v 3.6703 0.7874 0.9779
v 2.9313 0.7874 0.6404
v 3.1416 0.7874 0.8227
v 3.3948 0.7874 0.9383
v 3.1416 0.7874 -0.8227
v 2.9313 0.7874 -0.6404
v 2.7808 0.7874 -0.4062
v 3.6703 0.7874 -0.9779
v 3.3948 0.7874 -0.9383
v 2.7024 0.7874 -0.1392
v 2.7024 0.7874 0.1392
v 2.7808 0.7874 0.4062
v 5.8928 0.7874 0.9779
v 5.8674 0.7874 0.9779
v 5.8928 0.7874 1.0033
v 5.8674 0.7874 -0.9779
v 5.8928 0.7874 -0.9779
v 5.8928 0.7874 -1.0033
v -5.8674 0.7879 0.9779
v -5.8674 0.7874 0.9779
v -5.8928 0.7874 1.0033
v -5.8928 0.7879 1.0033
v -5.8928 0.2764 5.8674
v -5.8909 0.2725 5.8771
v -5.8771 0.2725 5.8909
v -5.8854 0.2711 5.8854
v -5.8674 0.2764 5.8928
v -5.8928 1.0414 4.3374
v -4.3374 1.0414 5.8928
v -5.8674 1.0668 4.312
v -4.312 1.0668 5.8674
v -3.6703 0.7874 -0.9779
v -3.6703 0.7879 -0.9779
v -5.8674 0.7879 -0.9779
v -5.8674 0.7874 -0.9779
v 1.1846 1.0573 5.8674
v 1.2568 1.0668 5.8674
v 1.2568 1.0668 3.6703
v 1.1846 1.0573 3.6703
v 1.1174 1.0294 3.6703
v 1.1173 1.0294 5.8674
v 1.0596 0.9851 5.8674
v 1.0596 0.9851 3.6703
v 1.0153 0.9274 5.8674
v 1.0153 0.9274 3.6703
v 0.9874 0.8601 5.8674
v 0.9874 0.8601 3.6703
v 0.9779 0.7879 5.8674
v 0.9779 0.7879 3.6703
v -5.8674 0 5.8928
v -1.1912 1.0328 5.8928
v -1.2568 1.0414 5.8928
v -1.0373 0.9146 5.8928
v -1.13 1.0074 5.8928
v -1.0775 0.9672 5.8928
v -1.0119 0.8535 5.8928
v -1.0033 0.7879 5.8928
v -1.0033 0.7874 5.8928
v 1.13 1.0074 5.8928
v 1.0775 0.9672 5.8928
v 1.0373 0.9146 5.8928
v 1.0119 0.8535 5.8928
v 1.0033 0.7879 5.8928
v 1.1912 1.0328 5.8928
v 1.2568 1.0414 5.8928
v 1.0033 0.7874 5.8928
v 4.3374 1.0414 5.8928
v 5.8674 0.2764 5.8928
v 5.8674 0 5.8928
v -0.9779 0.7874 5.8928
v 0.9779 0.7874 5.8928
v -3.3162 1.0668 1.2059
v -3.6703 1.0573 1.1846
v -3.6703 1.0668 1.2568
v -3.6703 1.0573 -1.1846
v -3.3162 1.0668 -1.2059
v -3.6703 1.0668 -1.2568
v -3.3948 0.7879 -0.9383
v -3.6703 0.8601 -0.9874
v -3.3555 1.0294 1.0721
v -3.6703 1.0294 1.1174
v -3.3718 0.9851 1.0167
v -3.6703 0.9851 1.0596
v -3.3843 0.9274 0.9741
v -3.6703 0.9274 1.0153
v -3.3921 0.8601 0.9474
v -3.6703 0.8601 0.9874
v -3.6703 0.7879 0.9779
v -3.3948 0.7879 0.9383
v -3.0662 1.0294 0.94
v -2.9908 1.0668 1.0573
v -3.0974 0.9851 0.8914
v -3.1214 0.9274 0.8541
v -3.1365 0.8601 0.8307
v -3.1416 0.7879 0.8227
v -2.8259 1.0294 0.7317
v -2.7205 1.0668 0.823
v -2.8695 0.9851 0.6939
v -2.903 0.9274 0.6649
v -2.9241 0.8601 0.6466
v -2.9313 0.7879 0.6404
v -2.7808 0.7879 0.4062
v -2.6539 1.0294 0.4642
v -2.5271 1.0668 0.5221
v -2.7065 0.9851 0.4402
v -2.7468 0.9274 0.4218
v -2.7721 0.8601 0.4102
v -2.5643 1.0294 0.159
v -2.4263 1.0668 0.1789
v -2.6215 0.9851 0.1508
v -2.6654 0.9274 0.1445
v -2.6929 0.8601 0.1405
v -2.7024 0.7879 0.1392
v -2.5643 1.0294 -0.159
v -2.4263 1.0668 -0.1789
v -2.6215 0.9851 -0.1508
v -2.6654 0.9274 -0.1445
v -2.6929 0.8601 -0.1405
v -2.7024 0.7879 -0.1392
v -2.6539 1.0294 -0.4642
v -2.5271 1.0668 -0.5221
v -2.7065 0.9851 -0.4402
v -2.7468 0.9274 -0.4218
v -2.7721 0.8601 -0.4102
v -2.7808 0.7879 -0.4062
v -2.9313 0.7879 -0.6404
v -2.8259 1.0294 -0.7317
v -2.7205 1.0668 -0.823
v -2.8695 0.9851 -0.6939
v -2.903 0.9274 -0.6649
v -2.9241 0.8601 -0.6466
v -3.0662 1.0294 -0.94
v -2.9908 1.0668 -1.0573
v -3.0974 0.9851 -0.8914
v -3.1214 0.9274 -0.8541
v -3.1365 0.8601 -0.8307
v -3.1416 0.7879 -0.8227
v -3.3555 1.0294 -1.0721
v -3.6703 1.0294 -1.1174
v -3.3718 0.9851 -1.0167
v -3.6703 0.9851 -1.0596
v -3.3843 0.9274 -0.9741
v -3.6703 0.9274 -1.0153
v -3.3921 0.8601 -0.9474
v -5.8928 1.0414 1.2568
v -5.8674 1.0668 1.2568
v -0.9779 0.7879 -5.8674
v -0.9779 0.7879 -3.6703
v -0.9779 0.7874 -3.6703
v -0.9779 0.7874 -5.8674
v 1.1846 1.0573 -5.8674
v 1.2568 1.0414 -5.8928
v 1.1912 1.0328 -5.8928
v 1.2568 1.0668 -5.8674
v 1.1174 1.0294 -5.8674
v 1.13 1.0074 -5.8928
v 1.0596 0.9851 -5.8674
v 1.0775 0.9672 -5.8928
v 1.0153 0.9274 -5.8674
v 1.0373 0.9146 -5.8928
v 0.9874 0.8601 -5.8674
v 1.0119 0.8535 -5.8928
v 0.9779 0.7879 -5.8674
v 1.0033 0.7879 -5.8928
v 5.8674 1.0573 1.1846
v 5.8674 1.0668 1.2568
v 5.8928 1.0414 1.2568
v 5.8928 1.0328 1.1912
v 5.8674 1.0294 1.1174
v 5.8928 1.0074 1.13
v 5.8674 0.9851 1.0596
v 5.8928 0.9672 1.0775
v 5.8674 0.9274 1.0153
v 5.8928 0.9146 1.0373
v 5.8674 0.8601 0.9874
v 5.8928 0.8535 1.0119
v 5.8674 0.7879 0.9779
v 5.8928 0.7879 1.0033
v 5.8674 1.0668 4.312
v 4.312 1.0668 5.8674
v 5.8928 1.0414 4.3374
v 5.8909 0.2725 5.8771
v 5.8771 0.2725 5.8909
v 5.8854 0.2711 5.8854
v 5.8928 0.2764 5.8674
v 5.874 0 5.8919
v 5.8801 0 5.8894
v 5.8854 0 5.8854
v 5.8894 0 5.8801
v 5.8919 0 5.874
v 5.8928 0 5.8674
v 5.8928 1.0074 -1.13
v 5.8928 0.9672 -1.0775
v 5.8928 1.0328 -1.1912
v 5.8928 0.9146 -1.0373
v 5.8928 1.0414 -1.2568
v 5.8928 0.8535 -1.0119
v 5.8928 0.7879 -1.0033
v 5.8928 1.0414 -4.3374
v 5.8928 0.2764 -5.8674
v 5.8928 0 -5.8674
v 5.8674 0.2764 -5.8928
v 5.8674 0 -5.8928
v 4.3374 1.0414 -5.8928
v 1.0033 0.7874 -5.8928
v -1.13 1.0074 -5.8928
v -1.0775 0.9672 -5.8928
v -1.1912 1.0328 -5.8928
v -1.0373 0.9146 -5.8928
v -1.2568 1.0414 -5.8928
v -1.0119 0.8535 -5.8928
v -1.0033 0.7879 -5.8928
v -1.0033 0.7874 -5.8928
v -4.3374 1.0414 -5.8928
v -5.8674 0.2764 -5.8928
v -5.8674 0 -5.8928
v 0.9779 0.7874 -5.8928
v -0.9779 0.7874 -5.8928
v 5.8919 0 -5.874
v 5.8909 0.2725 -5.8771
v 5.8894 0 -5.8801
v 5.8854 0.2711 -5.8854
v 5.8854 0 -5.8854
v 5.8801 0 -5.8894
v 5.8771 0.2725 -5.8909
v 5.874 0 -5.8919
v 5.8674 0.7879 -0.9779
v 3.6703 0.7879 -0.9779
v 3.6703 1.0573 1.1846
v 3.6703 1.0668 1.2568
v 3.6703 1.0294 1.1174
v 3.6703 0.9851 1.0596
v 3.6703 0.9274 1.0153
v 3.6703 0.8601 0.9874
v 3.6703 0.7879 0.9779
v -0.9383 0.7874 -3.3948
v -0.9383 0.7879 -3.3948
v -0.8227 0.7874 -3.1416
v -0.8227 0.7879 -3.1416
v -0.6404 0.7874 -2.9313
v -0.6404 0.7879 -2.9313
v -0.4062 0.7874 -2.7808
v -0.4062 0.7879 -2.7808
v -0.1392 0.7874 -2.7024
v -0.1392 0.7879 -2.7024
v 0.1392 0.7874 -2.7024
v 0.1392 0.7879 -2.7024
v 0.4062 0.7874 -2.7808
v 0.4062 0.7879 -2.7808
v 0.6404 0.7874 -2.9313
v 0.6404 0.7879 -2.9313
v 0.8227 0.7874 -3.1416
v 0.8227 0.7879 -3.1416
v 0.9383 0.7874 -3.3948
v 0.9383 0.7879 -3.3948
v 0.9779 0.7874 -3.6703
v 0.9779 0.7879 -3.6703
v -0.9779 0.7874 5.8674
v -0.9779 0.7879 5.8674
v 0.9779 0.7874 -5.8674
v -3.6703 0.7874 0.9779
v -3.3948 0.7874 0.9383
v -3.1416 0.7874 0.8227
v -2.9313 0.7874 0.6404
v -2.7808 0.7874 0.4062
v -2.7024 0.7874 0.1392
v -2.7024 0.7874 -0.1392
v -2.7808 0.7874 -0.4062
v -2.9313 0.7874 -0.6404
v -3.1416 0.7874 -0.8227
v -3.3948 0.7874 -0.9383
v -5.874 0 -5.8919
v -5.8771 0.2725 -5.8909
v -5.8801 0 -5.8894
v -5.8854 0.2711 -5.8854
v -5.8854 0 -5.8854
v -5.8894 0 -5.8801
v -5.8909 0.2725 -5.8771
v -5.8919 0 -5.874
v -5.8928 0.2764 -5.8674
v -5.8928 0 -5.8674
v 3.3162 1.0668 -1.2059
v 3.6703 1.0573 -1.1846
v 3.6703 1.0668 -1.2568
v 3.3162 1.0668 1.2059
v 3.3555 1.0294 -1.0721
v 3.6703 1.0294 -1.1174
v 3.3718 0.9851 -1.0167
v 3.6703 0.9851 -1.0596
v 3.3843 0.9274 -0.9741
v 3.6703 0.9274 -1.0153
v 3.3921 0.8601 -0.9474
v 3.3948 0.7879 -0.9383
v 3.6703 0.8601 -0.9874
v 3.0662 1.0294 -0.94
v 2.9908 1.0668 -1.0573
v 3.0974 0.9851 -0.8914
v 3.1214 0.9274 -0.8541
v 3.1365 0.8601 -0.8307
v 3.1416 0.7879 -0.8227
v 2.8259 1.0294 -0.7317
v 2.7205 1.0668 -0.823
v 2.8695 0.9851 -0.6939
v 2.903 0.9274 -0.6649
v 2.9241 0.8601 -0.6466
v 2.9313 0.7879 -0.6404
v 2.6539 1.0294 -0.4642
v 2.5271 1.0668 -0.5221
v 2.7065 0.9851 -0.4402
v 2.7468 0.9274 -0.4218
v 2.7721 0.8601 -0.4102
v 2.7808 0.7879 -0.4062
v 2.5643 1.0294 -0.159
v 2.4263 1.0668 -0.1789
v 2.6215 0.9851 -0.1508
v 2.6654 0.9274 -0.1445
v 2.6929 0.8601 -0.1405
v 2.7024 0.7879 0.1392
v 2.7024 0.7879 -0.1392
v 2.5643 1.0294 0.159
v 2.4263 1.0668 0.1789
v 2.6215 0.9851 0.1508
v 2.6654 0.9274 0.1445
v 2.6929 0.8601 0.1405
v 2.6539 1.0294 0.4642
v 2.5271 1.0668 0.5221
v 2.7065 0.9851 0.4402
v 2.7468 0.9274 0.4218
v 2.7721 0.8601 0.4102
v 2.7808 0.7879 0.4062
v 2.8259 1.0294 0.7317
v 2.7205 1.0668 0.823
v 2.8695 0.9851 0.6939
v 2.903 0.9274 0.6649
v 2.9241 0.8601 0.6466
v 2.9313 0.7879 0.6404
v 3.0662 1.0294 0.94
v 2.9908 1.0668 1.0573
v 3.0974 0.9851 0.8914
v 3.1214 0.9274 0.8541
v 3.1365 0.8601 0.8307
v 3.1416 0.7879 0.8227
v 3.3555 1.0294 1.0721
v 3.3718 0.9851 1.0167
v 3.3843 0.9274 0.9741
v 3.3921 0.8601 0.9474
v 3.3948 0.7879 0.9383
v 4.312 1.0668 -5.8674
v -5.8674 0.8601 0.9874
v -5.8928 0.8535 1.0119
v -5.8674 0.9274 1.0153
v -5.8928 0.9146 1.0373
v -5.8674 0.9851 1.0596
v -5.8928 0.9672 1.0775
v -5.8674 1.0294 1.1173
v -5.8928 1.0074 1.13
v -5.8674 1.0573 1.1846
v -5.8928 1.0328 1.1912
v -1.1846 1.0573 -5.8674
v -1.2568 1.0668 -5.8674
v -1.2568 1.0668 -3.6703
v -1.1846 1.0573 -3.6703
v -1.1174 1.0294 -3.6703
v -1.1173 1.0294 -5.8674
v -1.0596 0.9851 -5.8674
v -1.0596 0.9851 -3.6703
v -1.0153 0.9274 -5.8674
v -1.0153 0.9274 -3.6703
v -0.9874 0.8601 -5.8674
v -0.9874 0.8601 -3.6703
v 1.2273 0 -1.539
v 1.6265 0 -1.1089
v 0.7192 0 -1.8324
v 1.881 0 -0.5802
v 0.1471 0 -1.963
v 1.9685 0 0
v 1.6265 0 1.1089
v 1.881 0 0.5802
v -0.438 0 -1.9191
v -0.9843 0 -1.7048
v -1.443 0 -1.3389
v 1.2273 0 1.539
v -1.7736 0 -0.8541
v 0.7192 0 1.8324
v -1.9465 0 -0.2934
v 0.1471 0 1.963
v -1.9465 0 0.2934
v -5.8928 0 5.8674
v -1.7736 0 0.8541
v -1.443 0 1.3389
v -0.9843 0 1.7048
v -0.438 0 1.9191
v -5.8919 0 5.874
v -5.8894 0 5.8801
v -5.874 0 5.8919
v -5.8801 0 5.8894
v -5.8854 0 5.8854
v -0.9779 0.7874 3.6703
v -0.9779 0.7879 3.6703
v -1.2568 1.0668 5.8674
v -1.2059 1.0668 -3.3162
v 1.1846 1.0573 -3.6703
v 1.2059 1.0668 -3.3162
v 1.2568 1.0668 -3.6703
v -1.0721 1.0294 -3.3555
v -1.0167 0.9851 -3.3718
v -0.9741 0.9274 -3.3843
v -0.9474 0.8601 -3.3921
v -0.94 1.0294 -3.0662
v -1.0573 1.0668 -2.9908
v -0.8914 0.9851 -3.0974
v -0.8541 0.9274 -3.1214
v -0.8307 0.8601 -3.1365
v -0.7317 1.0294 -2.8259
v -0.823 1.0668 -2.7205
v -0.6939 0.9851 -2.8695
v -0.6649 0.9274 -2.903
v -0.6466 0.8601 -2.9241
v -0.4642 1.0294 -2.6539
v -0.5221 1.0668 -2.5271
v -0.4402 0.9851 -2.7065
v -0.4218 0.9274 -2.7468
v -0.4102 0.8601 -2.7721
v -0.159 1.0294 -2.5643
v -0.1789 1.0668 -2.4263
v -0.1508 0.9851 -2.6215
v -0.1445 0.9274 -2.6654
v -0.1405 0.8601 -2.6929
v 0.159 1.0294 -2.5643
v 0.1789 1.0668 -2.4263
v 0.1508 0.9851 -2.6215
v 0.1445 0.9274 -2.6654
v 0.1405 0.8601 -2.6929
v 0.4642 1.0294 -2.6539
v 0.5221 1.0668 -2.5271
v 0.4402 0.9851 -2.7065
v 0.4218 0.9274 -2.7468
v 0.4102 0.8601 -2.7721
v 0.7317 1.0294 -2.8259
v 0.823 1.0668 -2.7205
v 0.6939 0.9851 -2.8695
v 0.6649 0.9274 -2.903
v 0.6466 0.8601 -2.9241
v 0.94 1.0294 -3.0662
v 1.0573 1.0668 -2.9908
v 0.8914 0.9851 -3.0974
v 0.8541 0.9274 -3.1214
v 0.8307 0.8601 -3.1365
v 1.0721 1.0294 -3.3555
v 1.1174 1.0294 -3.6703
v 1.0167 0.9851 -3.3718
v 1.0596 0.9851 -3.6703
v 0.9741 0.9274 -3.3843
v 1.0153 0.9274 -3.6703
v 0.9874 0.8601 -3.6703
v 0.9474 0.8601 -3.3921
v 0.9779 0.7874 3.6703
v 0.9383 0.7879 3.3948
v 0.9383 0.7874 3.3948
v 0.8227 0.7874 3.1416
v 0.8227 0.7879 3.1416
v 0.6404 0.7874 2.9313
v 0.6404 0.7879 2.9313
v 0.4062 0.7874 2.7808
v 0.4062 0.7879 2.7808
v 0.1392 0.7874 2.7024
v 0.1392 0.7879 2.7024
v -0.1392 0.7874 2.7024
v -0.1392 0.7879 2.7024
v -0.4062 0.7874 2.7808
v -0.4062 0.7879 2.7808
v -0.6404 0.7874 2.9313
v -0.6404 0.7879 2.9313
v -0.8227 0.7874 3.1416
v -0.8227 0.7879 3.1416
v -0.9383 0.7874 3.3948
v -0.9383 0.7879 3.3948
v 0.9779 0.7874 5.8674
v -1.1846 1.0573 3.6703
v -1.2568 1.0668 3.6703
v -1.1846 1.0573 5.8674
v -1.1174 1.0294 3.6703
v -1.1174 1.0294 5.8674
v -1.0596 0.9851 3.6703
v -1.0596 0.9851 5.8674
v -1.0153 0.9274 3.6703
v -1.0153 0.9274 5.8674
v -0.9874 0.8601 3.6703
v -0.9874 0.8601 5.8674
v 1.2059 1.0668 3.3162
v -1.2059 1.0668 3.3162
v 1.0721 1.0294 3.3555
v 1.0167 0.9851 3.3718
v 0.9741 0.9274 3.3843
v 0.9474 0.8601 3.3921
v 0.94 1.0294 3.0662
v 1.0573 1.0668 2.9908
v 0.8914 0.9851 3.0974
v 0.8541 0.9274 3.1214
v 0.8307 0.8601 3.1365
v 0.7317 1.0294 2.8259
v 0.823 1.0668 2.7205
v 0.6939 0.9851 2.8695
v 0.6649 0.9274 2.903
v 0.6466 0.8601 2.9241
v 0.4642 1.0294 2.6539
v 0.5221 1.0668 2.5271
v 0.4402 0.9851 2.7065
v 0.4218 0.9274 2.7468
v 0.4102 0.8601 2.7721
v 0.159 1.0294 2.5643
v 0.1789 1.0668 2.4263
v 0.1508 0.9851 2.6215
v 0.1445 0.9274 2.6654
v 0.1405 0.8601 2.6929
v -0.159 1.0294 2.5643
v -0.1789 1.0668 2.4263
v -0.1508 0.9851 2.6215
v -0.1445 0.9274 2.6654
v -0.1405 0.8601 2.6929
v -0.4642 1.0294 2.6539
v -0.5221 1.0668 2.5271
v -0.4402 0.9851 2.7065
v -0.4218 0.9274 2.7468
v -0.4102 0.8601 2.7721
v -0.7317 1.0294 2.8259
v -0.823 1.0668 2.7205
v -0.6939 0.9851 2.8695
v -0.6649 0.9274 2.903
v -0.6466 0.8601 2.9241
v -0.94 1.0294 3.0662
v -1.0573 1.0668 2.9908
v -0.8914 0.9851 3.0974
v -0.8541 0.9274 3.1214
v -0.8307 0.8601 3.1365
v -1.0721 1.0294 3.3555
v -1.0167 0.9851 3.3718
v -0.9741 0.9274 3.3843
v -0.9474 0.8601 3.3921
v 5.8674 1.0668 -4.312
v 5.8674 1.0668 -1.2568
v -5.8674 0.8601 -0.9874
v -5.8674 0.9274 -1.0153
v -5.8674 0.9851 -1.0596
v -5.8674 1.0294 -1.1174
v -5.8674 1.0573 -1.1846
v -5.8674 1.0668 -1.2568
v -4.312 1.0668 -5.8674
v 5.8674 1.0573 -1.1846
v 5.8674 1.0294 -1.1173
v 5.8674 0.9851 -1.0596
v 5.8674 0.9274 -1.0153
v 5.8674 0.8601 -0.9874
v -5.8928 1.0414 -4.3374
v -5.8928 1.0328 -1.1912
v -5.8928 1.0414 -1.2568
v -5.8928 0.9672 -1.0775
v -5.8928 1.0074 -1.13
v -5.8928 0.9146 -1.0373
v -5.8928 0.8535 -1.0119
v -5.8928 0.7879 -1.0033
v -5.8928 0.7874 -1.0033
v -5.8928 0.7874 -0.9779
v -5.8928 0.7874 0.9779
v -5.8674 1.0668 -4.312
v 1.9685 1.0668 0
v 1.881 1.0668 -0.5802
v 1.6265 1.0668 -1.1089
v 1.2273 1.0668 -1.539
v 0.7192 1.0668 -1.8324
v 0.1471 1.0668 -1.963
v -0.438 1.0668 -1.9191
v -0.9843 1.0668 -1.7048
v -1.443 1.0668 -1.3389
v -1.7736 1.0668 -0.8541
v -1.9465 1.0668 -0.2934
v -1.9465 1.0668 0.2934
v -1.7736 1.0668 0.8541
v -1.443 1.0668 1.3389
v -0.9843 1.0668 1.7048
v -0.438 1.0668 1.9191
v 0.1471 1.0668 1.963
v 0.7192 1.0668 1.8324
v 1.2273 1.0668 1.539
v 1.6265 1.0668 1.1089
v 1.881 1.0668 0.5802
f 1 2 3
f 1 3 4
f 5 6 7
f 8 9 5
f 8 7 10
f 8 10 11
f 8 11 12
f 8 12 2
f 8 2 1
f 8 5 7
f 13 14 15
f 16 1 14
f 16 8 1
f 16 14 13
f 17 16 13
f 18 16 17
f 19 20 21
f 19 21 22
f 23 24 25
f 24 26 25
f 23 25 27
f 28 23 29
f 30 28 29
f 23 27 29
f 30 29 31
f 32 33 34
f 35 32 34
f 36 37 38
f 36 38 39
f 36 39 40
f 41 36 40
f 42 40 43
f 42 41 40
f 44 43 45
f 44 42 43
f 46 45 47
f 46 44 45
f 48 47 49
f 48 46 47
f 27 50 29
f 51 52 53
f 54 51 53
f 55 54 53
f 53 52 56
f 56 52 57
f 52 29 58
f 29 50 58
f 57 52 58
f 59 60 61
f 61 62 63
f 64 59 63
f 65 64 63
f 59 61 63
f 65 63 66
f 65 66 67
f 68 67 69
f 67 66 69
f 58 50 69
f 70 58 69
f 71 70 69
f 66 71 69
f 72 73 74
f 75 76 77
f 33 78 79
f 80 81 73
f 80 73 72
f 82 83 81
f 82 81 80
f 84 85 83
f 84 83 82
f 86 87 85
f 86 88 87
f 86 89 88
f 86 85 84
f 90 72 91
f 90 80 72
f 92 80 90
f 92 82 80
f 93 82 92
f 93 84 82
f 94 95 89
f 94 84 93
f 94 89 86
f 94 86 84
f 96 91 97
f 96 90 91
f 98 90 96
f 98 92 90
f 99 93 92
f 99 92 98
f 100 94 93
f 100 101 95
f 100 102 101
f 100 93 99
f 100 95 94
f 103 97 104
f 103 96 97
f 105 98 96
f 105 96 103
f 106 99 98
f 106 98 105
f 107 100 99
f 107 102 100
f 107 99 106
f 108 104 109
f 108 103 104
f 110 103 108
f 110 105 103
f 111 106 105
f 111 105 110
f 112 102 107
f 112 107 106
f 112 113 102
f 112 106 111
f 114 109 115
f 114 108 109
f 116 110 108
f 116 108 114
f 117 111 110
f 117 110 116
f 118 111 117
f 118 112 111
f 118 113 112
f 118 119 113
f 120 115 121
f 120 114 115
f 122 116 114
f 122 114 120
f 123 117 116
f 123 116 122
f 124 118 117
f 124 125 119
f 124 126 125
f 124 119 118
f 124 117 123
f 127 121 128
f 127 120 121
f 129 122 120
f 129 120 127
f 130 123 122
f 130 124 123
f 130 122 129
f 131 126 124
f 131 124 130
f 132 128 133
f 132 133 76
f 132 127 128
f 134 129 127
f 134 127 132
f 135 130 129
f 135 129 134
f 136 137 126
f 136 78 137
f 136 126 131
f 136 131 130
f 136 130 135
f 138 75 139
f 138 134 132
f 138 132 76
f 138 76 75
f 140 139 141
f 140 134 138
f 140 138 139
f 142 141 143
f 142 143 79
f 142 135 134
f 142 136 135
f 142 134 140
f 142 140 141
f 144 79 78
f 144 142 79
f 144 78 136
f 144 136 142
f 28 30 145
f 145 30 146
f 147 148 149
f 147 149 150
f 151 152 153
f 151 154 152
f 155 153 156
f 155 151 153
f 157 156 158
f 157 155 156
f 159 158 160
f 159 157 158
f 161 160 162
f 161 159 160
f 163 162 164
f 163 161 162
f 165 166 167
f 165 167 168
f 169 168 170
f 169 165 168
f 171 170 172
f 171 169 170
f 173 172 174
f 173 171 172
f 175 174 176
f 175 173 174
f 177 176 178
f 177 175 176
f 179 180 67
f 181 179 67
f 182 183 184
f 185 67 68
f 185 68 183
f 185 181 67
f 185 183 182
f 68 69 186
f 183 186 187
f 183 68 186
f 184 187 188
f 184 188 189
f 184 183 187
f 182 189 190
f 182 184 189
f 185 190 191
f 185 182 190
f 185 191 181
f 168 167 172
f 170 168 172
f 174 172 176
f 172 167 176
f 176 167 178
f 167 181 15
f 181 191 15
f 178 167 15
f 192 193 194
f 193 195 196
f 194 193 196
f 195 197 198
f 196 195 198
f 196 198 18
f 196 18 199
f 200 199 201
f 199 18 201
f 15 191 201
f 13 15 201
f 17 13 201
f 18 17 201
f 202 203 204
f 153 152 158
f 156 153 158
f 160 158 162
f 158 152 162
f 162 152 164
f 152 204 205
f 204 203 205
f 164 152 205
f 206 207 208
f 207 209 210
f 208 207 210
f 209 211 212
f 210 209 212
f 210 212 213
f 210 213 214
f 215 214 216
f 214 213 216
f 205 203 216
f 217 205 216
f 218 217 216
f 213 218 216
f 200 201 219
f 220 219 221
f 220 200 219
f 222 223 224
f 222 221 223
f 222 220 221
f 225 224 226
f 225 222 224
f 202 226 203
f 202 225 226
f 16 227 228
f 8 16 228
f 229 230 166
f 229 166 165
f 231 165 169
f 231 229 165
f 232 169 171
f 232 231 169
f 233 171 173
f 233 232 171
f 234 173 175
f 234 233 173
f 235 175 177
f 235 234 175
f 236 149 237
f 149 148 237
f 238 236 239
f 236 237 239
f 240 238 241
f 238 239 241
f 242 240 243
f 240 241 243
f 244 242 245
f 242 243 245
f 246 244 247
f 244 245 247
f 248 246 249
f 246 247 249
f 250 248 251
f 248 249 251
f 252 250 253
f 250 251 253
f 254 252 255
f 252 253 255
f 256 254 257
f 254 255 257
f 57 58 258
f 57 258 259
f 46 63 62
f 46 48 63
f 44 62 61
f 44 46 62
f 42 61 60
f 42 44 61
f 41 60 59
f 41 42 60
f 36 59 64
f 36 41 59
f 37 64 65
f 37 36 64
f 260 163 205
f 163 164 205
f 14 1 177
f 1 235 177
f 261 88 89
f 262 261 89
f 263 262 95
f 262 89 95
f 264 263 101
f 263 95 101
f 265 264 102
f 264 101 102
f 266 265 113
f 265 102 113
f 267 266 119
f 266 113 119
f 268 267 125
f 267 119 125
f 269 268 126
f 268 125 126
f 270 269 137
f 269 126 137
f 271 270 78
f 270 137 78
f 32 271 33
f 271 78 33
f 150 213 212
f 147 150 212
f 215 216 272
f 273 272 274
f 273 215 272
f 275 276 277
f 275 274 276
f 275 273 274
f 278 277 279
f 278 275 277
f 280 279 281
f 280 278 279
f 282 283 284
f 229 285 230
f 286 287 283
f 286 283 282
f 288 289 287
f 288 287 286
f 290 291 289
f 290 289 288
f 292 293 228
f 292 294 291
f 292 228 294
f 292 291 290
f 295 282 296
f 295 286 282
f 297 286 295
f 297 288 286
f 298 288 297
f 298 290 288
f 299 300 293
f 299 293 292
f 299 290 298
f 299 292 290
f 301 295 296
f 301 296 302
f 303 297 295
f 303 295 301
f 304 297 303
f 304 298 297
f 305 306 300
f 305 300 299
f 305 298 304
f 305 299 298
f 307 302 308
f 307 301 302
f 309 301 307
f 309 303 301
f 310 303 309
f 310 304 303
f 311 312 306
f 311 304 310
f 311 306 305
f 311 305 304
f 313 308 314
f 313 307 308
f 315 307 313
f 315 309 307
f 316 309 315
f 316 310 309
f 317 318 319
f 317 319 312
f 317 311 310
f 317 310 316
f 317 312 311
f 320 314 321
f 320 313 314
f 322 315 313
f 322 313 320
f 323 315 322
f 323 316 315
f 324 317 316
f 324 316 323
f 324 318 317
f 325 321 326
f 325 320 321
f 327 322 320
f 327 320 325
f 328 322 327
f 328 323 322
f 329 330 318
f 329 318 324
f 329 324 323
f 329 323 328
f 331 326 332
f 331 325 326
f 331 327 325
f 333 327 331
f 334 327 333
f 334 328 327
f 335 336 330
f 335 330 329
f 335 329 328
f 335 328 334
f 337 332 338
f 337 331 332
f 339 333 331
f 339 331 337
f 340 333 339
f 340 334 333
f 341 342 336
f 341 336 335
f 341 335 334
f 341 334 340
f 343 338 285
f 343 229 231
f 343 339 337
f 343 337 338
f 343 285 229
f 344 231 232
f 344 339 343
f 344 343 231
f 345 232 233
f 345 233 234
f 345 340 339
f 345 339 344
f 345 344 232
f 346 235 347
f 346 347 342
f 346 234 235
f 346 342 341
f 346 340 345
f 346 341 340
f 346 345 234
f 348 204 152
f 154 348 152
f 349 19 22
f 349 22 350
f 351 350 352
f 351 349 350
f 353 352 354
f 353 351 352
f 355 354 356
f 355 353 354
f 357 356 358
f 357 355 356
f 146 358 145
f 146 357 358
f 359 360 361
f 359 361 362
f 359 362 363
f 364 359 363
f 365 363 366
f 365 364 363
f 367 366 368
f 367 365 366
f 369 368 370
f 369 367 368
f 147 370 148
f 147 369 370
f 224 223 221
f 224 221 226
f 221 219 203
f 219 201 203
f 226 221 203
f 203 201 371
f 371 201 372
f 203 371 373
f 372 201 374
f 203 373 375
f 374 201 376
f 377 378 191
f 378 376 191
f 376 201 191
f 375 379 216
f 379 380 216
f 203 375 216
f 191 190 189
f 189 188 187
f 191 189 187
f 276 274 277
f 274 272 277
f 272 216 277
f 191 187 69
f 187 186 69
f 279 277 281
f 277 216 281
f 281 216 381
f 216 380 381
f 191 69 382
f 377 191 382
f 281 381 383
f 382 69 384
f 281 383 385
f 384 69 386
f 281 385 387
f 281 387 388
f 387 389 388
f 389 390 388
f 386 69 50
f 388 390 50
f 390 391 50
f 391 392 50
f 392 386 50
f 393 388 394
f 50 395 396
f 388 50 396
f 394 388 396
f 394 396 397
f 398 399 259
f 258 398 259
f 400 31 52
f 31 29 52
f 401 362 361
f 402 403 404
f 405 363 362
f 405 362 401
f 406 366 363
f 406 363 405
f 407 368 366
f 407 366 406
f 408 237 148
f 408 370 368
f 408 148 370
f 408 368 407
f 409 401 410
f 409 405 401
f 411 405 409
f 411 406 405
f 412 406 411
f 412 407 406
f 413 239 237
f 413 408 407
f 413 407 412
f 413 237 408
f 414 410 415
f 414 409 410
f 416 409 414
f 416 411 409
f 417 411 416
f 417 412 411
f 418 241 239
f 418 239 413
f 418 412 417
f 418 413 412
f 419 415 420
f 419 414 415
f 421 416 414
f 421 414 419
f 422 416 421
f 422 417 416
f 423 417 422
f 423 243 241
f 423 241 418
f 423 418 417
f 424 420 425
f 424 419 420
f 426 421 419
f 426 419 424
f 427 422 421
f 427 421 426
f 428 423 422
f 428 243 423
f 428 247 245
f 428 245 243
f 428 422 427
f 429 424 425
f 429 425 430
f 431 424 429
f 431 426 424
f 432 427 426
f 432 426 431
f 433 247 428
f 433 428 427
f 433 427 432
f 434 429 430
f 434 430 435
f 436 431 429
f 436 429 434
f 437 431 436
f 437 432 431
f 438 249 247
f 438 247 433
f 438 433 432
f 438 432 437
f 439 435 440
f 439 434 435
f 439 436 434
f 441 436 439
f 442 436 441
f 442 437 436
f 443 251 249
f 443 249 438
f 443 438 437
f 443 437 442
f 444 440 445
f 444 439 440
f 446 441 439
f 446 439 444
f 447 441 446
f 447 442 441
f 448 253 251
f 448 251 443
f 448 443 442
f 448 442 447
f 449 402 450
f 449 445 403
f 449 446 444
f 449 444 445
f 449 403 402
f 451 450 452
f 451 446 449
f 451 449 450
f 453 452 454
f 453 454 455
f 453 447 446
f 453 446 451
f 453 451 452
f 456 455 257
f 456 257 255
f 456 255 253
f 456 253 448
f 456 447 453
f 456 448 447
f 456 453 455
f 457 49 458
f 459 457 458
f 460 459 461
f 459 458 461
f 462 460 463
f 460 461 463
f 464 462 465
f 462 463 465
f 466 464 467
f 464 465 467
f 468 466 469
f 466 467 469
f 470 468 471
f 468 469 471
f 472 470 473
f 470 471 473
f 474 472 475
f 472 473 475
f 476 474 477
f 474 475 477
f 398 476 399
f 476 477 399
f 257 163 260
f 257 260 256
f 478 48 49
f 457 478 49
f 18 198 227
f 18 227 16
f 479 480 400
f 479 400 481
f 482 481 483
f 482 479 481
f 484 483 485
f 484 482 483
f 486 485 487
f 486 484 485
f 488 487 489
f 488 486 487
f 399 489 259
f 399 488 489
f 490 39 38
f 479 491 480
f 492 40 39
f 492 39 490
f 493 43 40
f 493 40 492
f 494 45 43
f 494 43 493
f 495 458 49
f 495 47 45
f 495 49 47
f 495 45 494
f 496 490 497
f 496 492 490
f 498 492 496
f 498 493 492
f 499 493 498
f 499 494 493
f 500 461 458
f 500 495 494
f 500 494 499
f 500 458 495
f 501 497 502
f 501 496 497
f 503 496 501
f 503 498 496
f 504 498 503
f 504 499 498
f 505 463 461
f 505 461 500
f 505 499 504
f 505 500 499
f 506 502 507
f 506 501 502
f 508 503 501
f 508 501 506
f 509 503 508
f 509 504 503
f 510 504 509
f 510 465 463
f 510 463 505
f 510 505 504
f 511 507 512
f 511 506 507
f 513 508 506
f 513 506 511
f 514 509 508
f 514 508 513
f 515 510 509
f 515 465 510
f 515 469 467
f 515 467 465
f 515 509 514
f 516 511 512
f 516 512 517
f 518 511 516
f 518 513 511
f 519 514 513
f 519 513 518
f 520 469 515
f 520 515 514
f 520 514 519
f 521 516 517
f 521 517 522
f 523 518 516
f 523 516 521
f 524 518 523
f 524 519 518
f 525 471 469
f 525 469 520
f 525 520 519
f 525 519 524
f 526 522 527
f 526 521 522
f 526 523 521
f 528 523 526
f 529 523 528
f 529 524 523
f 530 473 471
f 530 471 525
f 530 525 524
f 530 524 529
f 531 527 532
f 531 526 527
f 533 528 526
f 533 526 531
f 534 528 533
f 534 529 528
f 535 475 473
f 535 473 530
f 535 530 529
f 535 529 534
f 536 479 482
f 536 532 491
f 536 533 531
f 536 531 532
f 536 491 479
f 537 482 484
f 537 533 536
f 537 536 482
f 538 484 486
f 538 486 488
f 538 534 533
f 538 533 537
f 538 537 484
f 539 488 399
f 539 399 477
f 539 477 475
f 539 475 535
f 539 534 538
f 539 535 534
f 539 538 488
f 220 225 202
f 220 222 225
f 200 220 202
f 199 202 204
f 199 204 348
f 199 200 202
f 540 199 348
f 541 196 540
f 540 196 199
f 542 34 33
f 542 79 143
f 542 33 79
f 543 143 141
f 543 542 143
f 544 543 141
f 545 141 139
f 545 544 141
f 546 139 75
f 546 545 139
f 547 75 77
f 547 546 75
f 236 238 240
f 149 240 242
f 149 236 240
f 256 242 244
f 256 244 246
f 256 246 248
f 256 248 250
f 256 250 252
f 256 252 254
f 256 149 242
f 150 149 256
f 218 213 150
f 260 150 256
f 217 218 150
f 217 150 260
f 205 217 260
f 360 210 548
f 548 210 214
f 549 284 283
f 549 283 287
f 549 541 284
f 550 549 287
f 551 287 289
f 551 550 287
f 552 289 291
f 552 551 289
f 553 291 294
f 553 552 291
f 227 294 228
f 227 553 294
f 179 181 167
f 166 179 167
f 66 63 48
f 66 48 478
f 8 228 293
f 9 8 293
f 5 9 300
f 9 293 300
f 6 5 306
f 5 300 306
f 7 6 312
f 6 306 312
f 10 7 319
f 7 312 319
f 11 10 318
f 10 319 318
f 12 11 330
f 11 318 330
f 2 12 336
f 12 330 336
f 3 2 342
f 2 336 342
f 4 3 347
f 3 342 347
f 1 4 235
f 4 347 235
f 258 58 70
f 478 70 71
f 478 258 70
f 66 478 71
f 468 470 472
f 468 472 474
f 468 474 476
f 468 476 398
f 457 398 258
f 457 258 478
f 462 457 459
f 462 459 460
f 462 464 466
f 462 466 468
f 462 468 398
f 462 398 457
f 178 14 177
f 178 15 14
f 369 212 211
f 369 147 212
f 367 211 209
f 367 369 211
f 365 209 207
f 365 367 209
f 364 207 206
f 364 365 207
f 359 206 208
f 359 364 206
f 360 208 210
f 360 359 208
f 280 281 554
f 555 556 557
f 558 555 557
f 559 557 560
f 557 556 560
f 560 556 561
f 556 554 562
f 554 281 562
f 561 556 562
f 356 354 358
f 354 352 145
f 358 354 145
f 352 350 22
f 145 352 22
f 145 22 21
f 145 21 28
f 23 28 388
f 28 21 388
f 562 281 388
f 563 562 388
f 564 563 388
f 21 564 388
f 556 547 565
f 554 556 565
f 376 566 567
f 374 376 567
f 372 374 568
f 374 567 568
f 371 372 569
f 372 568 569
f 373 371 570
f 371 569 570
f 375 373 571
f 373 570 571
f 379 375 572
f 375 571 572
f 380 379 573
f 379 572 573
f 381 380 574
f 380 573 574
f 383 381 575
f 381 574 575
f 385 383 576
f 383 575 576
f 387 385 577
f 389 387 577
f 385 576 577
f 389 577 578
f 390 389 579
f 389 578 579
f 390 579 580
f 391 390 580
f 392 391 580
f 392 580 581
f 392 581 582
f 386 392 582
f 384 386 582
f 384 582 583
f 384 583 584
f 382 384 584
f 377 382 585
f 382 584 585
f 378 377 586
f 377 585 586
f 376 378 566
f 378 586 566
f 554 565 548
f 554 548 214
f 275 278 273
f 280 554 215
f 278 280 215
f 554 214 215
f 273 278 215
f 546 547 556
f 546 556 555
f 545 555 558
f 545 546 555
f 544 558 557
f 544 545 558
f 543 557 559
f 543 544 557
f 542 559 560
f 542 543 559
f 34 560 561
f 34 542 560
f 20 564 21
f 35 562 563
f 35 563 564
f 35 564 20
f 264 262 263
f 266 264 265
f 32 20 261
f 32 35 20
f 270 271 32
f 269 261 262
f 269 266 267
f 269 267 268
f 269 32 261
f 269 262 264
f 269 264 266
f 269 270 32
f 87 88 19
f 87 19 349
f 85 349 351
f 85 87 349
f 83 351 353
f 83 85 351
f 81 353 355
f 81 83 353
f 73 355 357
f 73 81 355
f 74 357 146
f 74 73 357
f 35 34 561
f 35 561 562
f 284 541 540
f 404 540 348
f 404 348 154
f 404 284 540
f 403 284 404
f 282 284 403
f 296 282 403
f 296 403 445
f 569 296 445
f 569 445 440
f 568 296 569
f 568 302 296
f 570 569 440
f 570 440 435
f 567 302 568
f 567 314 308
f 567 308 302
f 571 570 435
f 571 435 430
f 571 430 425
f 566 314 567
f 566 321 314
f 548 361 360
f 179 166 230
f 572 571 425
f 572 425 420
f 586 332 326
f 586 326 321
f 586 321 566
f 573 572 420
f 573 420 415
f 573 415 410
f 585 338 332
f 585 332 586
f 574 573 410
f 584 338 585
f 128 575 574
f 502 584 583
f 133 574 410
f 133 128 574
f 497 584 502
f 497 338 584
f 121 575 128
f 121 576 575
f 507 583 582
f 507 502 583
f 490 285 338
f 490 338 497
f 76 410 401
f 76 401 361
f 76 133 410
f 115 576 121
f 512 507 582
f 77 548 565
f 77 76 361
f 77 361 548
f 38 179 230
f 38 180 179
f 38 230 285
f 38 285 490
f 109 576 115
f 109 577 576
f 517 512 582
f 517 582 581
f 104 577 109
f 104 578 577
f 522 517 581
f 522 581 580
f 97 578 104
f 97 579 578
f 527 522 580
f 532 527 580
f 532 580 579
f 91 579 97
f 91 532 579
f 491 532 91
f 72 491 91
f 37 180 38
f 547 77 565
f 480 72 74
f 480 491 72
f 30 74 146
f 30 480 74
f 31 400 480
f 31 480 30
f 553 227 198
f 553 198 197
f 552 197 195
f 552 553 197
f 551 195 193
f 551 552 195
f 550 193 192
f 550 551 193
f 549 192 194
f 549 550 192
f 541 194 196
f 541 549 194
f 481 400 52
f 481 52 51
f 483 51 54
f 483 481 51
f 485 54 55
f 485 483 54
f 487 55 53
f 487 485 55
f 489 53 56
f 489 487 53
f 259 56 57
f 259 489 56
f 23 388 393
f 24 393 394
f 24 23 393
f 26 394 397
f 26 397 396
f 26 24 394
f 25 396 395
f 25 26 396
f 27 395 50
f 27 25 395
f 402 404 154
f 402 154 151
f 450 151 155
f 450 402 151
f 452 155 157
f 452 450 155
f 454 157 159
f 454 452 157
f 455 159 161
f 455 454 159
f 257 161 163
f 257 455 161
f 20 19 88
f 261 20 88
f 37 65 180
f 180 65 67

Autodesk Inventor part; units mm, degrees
ref_plane "YZ Plane" through (0, 0, 0) normal (1, 0, 0) x (0, 1, 0)
ref_plane "XZ Plane" through (0, 0, 0) normal (0, 1, 0) x (-1, 0, 0)
ref_plane "XY Plane" through (0, 0, 0) normal (0, 0, 1) x (1, 0, 0)
sketch "Sketch1" plane through (0, 0, 0) normal (0, 1, 0) x (-1, 0, 0)
  line L0 (5.8928, 5.8928) -> (-5.8928, 5.8928)
  line L1 (-5.8928, 5.8928) -> (-5.8928, -5.8928)
  line L2 (-5.8928, -5.8928) -> (5.8928, -5.8928)
  line L3 (5.8928, -5.8928) -> (5.8928, 5.8928)
  point P0 (0, 0)
  point P1 (5.8928, 0)
  point P2 (0, -5.8928)
  dimension "d0" = 11.7856
extrude "Extrusion1" add sketch "Sketch1" along normal blind 1.0668
sketch "Sketch2" plane through (0, 1.0668, 0) normal (0, 1, 0) x (1, 0, 0)
  line L0 (3.6703, -0.9779) -> (5.8928, -0.9779)
  line L1 (5.8928, -0.9779) -> (5.8928, 0.9779)
  line L2 (5.8928, 0.9779) -> (3.6703, 0.9779)
  line L3 (2.6924, 0) -> (2.6924, 0)
  line L4 (5.8928, -5.8928) -> (5.8928, 5.8928) projected
  arc A0 (3.6703, 0.9779) -> (2.6924, 0) centre (3.6703, 0) ccw
  arc A1 (2.6924, 0) -> (3.6703, -0.9779) centre (3.6703, 0) ccw
  line L5 (-0.9779, -5.8928) -> (0.9779, -5.8928)
  line L6 (0.9779, -5.8928) -> (0.9779, -3.6703)
  line L7 (0, -2.6924) -> (0, -2.6924)
  line L8 (-0.9779, -3.6703) -> (-0.9779, -5.8928)
  arc A2 (0.9779, -3.6703) -> (0, -2.6924) centre (0, -3.6703) ccw
  arc A3 (0, -2.6924) -> (-0.9779, -3.6703) centre (0, -3.6703) ccw
  line L9 (-5.8928, 5.8928) -> (-5.8928, -5.8928) projected
  line L10 (-5.8928, -0.9779) -> (-3.6703, -0.9779)
  line L11 (-2.6924, 0) -> (-2.6924, 0)
  line L12 (-3.6703, 0.9779) -> (-5.8928, 0.9779)
  line L13 (-5.8928, 0.9779) -> (-5.8928, -0.9779)
  arc A4 (-3.6703, -0.9779) -> (-2.6924, 0) centre (-3.6703, 0) ccw
  arc A5 (-2.6924, 0) -> (-3.6703, 0.9779) centre (-3.6703, 0) ccw
  line L14 (5.8928, 5.8928) -> (-5.8928, 5.8928) projected
  line L15 (-0.9779, 5.8928) -> (0.9779, 5.8928)
  line L16 (0.9779, 5.8928) -> (0.9779, 3.6703)
  line L17 (0, 2.6924) -> (0, 2.6924)
  line L18 (-0.9779, 3.6703) -> (-0.9779, 5.8928)
  arc A6 (-0.9779, 3.6703) -> (0, 2.6924) centre (0, 3.6703) ccw
  arc A7 (0, 2.6924) -> (0.9779, 3.6703) centre (0, 3.6703) ccw
  point P0 (0, 0)
  point P1 (2.6924, 0.9779)
  point P2 (2.6924, 0)
  point P3 (5.8928, 0)
  point P4 (5.8928, 0)
  point P5 (0.9779, -2.6924)
  point P6 (-0.9779, -2.6924)
  point P7 (0, -2.6924)
  point P8 (-2.6924, 0.9779)
  point P9 (-5.8928, 0)
  point P10 (-5.8928, 0)
  point P11 (0.9779, 2.6924)
  point P12 (0, 5.8928)
  point P13 (0, 5.8928)
  dimension "d3" = 3.2004
  dimension "d4" = 1.9558
  dimension "d5" = 0.9779
  dimension "d6" = 1.9558
  dimension "d7" = 3.2004
  dimension "d8" = 0.9779
  dimension "d9" = 3.2004
  dimension "d10" = 0.9779
  dimension "d11" = 3.2004
  dimension "d12" = 0.9779
extrude "Extrusion2" cut sketch "Sketch2" against normal blind 0.2794
fillet "Fillet1" radius 0.2794 12 edges at (-4.7816, 1.0668, 0.9779) (-4.7816, 1.0668, -0.9779) (-2.6924, 1.0668, 0) (0, 1.0668, -2.6924) (0.9779, 1.0668, -4.7816) (-0.9779, 1.0668, -4.7816) (2.6924, 1.0668, 0) (4.7816, 1.0668, 0.9779) (4.7816, 1.0668, -0.9779) (0, 1.0668, 2.6924) (-0.9779, 1.0668, 4.7816) (0.9779, 1.0668, 4.7816)
sketch "Sketch3" plane through (0, 0, 0) normal (0, -1, 0) x (1, 0, 0)
  point P0 (0, 0)
sketch "Sketch4" plane through (0, 1.0668, 0) normal (0, 1, 0) x (1, 0, 0)
  circle A0 centre (0, 0) radius 1.9685
  dimension "d16" = 3.937
extrude "Extrusion3" cut sketch "Sketch4" against normal through all
chamfer "Chamfer1" distance 0.0254 angle 45 16 edges at (5.8928, 1.0668, 3.5748) (5.8928, 0.9851, 1.0596) (3.5748, 1.0668, 5.8928) (1.0596, 0.9851, 5.8928) (5.8928, 1.0668, -3.5748) (5.8928, 0.9851, -1.0596) (3.5748, 1.0668, -5.8928) (1.0596, 0.9851, -5.8928) (-3.5748, 1.0668, -5.8928) (-1.0596, 0.9851, -5.8928) (-5.8928, 1.0668, -3.5748) (-5.8928, 0.9851, -1.0596) (-5.8928, 1.0668, 3.5748) (-5.8928, 0.9851, 1.0596) (-3.5748, 1.0668, 5.8928) (-1.0596, 0.9851, 5.8928)
chamfer "Chamfer2" distance 1.27 angle 45 4 edges at (5.8801, 1.0541, 5.8801) (5.8801, 1.0541, -5.8801) (-5.8801, 1.0541, -5.8801) (-5.8801, 1.0541, 5.8801)
fillet "Fillet2" radius 0.0254 4 edges at (-5.8928, 0.1318, 5.8928) (5.8928, 0.1318, 5.8928) (5.8928, 0.1318, -5.8928) (-5.8928, 0.1318, -5.8928)
properties part number "SSR-40 DA Big Plate" material "Nickel-Copper Alloy 400"
